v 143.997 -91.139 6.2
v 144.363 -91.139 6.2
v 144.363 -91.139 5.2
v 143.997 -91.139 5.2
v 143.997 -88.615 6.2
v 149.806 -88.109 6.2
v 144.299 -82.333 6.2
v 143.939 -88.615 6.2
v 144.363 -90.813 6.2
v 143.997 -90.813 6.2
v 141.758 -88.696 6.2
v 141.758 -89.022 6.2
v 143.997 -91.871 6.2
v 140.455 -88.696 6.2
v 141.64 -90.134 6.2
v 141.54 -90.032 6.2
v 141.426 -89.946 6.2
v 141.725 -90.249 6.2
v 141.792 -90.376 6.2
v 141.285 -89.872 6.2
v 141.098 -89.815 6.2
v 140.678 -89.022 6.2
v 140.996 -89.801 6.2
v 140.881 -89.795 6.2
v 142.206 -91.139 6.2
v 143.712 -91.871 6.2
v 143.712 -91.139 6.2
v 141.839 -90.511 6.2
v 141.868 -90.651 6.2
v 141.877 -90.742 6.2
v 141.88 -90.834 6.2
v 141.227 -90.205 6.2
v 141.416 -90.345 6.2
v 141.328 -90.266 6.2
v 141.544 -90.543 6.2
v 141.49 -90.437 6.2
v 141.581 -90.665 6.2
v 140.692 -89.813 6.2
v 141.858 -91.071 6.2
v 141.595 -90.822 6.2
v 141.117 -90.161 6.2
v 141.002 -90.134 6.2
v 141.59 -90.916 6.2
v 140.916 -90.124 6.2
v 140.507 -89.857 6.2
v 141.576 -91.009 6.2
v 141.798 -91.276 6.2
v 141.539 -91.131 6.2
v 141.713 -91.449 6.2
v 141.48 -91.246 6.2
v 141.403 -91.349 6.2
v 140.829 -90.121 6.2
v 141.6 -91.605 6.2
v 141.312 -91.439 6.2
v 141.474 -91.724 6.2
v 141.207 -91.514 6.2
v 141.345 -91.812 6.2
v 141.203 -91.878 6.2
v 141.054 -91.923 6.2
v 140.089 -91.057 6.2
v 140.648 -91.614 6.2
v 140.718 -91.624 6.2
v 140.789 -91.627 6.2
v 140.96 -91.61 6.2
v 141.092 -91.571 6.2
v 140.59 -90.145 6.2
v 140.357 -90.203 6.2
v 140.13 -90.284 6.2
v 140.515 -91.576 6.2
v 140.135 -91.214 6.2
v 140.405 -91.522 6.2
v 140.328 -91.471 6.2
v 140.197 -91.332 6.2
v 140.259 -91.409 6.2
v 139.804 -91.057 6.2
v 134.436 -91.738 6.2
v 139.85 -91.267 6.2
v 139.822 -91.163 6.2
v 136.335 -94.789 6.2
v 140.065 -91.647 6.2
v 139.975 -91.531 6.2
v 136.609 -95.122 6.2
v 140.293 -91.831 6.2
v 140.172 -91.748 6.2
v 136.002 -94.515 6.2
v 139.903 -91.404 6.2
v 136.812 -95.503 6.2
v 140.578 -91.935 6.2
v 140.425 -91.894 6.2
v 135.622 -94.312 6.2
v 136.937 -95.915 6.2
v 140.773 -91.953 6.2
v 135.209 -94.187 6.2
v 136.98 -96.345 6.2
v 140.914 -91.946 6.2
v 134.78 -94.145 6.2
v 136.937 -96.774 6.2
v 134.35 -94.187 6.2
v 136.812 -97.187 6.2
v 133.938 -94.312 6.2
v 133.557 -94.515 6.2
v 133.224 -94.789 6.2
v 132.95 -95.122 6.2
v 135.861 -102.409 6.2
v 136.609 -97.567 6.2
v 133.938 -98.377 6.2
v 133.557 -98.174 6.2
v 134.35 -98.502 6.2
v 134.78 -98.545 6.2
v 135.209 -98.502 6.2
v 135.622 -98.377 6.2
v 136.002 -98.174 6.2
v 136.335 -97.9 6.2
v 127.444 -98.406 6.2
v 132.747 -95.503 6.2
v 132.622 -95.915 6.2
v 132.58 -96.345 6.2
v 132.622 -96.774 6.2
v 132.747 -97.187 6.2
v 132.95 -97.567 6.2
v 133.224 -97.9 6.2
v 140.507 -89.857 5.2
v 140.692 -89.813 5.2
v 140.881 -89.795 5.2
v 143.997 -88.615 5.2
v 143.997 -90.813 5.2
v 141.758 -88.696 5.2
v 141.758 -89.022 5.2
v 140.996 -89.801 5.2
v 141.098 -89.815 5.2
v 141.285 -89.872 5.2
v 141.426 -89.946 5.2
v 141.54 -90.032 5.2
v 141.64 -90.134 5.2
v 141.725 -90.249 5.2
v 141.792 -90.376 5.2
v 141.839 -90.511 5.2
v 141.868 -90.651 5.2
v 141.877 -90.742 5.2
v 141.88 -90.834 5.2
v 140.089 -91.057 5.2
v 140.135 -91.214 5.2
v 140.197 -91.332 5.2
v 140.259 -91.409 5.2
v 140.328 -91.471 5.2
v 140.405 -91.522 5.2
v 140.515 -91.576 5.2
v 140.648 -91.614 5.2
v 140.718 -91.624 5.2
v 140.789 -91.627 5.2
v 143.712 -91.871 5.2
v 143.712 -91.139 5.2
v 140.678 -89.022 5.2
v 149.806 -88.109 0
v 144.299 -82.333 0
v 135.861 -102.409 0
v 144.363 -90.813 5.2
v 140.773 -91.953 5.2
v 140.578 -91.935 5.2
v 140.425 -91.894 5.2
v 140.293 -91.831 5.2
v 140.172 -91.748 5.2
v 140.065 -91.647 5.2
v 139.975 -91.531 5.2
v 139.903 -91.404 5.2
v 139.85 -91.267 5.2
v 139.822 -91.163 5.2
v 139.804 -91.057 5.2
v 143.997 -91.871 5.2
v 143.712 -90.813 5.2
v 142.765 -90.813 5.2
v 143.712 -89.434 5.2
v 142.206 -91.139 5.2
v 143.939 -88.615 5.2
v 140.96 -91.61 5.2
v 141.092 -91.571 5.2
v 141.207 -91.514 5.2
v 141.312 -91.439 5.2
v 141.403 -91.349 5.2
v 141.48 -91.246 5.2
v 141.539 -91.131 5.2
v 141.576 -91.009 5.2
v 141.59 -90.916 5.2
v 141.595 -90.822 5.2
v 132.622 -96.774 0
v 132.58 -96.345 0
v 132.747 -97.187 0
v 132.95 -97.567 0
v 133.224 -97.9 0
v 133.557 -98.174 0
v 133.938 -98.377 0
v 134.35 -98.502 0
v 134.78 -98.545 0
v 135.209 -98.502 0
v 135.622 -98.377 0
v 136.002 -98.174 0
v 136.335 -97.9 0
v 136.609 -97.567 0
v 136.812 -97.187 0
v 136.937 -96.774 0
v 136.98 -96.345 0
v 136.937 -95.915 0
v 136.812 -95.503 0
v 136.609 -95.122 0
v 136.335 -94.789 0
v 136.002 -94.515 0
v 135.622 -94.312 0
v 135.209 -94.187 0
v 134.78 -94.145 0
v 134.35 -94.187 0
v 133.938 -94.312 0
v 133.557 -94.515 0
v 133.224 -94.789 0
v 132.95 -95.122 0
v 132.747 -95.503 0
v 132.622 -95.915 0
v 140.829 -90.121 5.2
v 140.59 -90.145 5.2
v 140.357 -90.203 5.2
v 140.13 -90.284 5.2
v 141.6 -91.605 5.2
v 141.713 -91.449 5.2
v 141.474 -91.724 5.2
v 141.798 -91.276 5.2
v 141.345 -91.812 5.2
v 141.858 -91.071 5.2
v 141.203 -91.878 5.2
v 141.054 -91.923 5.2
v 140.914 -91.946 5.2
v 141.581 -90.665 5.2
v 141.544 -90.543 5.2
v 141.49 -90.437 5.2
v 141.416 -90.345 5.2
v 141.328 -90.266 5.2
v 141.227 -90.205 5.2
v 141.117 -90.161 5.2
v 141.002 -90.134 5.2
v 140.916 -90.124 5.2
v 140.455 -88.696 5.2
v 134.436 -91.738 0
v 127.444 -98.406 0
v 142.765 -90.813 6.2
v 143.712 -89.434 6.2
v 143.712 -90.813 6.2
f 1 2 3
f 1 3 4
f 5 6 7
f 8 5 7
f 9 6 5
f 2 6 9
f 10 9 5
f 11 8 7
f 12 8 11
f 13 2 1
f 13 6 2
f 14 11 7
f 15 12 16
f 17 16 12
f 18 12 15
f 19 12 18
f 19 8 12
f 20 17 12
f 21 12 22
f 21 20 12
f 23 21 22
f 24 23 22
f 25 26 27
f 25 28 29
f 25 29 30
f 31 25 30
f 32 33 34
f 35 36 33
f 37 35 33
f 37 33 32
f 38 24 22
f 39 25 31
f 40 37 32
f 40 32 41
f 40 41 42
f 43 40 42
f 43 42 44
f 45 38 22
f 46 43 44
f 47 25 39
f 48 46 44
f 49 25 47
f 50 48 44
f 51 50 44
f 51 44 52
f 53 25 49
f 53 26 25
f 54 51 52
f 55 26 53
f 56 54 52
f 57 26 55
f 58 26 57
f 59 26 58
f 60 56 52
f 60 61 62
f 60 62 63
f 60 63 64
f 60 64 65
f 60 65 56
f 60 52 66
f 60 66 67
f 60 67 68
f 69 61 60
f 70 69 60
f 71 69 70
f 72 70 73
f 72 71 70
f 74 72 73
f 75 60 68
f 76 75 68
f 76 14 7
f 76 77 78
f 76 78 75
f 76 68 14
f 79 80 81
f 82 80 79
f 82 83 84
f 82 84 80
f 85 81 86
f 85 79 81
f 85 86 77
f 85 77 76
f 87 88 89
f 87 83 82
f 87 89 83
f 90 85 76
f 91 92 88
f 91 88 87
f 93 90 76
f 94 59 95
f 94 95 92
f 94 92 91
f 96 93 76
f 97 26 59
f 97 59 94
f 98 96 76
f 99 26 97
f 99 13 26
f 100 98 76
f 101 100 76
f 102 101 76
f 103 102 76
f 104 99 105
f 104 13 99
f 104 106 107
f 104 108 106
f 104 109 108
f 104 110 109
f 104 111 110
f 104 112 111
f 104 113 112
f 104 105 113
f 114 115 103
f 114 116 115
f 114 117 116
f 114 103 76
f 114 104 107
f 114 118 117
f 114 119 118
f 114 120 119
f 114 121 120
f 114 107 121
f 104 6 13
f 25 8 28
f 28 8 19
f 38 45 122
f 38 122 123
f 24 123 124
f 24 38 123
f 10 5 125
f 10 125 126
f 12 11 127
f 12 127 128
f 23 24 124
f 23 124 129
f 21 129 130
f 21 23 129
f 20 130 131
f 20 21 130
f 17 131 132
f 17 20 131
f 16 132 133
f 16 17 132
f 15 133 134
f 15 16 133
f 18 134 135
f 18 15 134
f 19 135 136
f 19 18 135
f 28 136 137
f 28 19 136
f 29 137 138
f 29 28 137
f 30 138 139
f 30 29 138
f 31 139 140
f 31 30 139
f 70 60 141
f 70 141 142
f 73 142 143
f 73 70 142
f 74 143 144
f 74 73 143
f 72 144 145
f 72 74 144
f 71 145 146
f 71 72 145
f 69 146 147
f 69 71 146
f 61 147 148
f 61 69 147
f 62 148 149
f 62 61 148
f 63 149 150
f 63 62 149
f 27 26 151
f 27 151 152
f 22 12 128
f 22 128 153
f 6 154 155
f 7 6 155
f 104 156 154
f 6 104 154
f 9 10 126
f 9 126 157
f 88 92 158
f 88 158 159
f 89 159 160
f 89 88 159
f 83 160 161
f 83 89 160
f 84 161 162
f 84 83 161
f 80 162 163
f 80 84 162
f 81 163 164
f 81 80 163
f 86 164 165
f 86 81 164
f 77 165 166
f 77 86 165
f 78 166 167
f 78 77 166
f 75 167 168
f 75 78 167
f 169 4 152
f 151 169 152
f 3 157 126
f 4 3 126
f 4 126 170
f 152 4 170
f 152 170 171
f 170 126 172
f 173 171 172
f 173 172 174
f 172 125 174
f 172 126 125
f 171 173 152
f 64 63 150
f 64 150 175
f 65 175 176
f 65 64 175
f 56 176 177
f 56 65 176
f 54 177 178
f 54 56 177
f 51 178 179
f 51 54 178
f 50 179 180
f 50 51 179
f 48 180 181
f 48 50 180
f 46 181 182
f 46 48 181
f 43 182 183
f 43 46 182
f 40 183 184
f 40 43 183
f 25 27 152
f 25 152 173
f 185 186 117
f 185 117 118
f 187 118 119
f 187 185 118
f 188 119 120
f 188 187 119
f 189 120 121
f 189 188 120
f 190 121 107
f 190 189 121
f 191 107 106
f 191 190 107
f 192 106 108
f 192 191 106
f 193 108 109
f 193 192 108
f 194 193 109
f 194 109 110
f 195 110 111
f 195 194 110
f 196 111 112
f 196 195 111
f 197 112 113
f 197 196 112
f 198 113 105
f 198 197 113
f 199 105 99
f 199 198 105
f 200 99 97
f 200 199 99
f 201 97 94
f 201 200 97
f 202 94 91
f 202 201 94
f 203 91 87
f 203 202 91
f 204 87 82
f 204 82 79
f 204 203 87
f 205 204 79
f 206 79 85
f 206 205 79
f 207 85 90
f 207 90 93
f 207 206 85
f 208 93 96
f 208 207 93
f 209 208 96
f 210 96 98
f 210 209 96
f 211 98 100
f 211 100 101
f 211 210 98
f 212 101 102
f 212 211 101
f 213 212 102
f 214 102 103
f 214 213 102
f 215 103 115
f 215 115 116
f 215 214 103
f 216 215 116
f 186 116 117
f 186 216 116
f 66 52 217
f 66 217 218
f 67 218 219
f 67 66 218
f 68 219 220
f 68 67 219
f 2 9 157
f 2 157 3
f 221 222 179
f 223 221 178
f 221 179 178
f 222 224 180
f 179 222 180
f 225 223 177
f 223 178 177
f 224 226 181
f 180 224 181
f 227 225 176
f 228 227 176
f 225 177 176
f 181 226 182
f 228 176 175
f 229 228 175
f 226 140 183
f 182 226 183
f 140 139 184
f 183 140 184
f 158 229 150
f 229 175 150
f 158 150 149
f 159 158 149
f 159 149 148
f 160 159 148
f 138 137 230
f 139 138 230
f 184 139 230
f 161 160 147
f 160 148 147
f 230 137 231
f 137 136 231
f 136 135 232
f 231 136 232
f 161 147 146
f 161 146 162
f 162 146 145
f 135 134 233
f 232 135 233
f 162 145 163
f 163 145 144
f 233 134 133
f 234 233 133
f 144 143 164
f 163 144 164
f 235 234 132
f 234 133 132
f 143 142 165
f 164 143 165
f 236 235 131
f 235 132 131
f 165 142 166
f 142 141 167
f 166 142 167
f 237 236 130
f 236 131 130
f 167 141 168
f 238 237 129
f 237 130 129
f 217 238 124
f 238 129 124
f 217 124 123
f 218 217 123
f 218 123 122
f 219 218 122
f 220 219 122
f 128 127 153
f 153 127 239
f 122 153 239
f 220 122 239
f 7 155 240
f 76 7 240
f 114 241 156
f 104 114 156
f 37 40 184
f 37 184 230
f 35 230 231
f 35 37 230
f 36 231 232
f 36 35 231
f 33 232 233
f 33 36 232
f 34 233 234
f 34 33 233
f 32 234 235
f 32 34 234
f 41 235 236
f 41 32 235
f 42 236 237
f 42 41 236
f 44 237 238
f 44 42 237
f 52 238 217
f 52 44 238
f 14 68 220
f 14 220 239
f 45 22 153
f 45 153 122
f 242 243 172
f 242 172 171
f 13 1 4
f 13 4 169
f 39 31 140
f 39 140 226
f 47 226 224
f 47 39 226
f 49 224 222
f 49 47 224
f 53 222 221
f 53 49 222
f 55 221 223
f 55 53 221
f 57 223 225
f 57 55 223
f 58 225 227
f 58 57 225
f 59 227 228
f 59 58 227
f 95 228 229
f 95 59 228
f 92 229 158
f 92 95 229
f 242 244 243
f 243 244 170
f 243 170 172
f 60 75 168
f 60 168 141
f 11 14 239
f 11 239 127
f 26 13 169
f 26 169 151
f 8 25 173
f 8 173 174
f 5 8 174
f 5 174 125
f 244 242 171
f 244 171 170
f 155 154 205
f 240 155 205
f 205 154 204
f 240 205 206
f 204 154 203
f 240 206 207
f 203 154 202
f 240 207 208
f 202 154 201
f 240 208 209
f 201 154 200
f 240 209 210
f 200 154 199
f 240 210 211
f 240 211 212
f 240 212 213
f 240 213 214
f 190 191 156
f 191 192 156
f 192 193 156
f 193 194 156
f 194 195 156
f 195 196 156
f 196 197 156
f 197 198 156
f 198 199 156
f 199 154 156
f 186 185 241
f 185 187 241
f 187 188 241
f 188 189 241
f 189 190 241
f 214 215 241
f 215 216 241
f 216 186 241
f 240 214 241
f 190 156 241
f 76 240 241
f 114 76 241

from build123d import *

# Parameters (mm, degrees)
SKETCH1_R           = 2.2
BOSS_EXTRUDE1_DEPTH = 6.2
CUT_EXTRUDE1_DEPTH  = 1


with BuildPart() as part:
    # Sketch1 → Boss-Extrude1 (new body)
    with BuildSketch(Plane(origin=(0, 0, 0), x_dir=(-1, 0, 0), z_dir=(0, 0, 1))):
        Polygon((-135.861235396, 102.40882942), (-149.806405315, 88.109421961), (-144.298520867, 82.333425686), (-134.435779681, 91.738355366), (-127.443880814, 98.405702296), align=None)
        with Locations((-134.779596853, 96.344682986)):
            Circle(SKETCH1_R, mode=Mode.SUBTRACT)
    extrude(amount=BOSS_EXTRUDE1_DEPTH)

    # Sketch2 → Cut-Extrude1 (cut)
    with BuildSketch(Plane.XY.offset(6.2)):
        with BuildLine():
            Line((141.757865871, -88.696242194), (141.757865871, -89.021883219))
            Line((141.757865871, -89.021883219), (140.677907938, -89.021883219))
            Line((140.677907938, -89.021883219), (140.506819196, -89.856974365))
            add(Edge.make_bspline(
                [(140.506819196, -89.856974365), (140.540434168, -89.847694047), (140.605557859, -89.829714899), (140.70167859, -89.809752521), (140.792930089, -89.797718869), (140.852144175, -89.796075751), (140.880797562, -89.795280655)],
                knots=[0, 0, 0, 0, 0.000104595, 0.000202637, 0.000294305, 0.000380252, 0.000380252, 0.000380252, 0.000380252], degree=3))
            add(Edge.make_bspline(
                [(140.880797562, -89.795280655), (140.916252097, -89.79604804), (140.985964572, -89.79755691), (141.087962759, -89.812045659), (141.185329027, -89.834851153), (141.277859748, -89.866710483), (141.365726105, -89.907450027), (141.448119678, -89.958340687), (141.526277214, -90.01778878), (141.598796567, -90.08613747), (141.664586475, -90.161359222), (141.722431337, -90.242238148), (141.771564544, -90.327988241), (141.811080372, -90.419428794), (141.842634732, -90.515548883), (141.863636899, -90.617359868), (141.877622056, -90.723902092), (141.879184507, -90.796749809), (141.879981255, -90.833897442)],
                knots=[0, 0, 0, 0, 0.000106308, 0.000209029, 0.000308378, 0.000405929, 0.000502102, 0.000598312, 0.00069588, 0.000796219, 0.000896736, 0.000995218, 0.001094066, 0.001192613, 0.001293582, 0.001396995, 0.001504047, 0.001615439, 0.001615439, 0.001615439, 0.001615439], degree=3))
            add(Edge.make_bspline(
                [(141.879981255, -90.833897442), (141.879377937, -90.859771171), (141.878179454, -90.911168967), (141.872084735, -90.987499777), (141.860350193, -91.062214633), (141.844595186, -91.135323445), (141.824145992, -91.206687805), (141.799390922, -91.276511976), (141.769095954, -91.34436137), (141.735866064, -91.410877978), (141.698449616, -91.474558052), (141.65692197, -91.534111061), (141.61304756, -91.590430374), (141.565838589, -91.642911975), (141.514856258, -91.691210998), (141.460718002, -91.735614082), (141.403855821, -91.776872146), (141.343389994, -91.813310437), (141.280667885, -91.846841119), (141.214783716, -91.874348899), (141.147237224, -91.898942021), (141.077056229, -91.91854495), (141.004399699, -91.933905196), (140.929147867, -91.944337883), (140.851695402, -91.951936509), (140.799194498, -91.952412175), (140.772674565, -91.95265245)],
                knots=[0, 0, 0, 0, 7.7636e-05, 0.000154223, 0.000229512, 0.000304362, 0.000378447, 0.000452077, 0.000526407, 0.000601214, 0.00067506, 0.000747747, 0.00081887, 0.000889121, 0.000959302, 0.001029336, 0.001099058, 0.00116985, 0.001240974, 0.00131221, 0.00138383, 0.001456517, 0.001530612, 0.001606437, 0.001684346, 0.001763871, 0.001763871, 0.001763871, 0.001763871], degree=3))
            add(Edge.make_bspline(
                [(140.772674565, -91.95265245), (140.741038701, -91.952025761), (140.678798876, -91.950792825), (140.587612361, -91.937894628), (140.499878398, -91.919421647), (140.416303235, -91.891630173), (140.336137874, -91.856807413), (140.260461551, -91.812796315), (140.187340597, -91.762922414), (140.119747535, -91.704066665), (140.057013061, -91.63973601), (140.000855014, -91.569924436), (139.950840983, -91.495784156), (139.907771884, -91.416955116), (139.871034394, -91.333644449), (139.842173654, -91.245540013), (139.818879718, -91.153102152), (139.809025044, -91.089462896), (139.804019717, -91.05713963)],
                knots=[0, 0, 0, 0, 9.4843e-05, 0.000186593, 0.000275792, 0.000363484, 0.000450342, 0.000537514, 0.000625728, 0.000715478, 0.000805885, 0.000894984, 0.00098389, 0.001073836, 0.001164117, 0.001256635, 0.001351658, 0.001449737, 0.001449737, 0.001449737, 0.001449737], degree=3))
            Line((139.804019717, -91.05713963), (140.088955614, -91.05713963))
            add(Edge.make_bspline(
                [(140.088955614, -91.05713963), (140.09596652, -91.08741684), (140.10944187, -91.14561132), (140.139019942, -91.227373322), (140.175183986, -91.300234332), (140.218186502, -91.365158169), (140.269485459, -91.421772045), (140.328022869, -91.472224665), (140.393652589, -91.517740675), (140.466580733, -91.5556799), (140.543518312, -91.588036555), (140.624042853, -91.609582735), (140.705961796, -91.624732831), (140.761368603, -91.626249357), (140.789211023, -91.627011425)],
                knots=[0, 0, 0, 0, 9.3172e-05, 0.000179081, 0.000260145, 0.000336703, 0.000411917, 0.000488562, 0.000568128, 0.000650923, 0.00073478, 0.000817953, 0.000900557, 0.000983994, 0.000983994, 0.000983994, 0.000983994], degree=3))
            add(Edge.make_bspline(
                [(140.789211023, -91.627011425), (140.816387612, -91.626266862), (140.869898538, -91.624800811), (140.948648867, -91.613516851), (141.024679117, -91.596138197), (141.097239077, -91.570130542), (141.167598473, -91.538521405), (141.233977536, -91.497958443), (141.298296575, -91.451276855), (141.358556382, -91.397794769), (141.413746454, -91.338857975), (141.462510935, -91.275832054), (141.503129992, -91.208597486), (141.53736022, -91.138318269), (141.563352855, -91.064224149), (141.581895745, -90.986662369), (141.592784234, -90.905441351), (141.59428209, -90.850042763), (141.595045358, -90.821813107)],
                knots=[0, 0, 0, 0, 8.15e-05, 0.000160473, 0.000238226, 0.000315066, 0.000391338, 0.000469218, 0.000547964, 0.000629516, 0.000710512, 0.000789892, 0.000868102, 0.000945761, 0.001024012, 0.00110315, 0.001184644, 0.001269321, 0.001269321, 0.001269321, 0.001269321], degree=3))
            add(Edge.make_bspline(
                [(141.595045358, -90.821813107), (141.594448023, -90.79634439), (141.593278825, -90.746492999), (141.583726093, -90.673559433), (141.567109983, -90.604550316), (141.544046892, -90.539132404), (141.514764767, -90.477243995), (141.478981326, -90.418821219), (141.43602503, -90.364634099), (141.386955959, -90.314657283), (141.333200451, -90.268533718), (141.273833627, -90.229214439), (141.210097836, -90.196136457), (141.142760985, -90.167590487), (141.070221399, -90.147088382), (140.993915596, -90.131696086), (140.913019583, -90.12279215), (140.857710459, -90.121556723), (140.829280134, -90.120921681)],
                knots=[0, 0, 0, 0, 7.6388e-05, 0.000149519, 0.000220172, 0.000288967, 0.000357247, 0.000425206, 0.000494043, 0.000564207, 0.000635056, 0.000706145, 0.000777268, 0.000850264, 0.000925136, 0.001002969, 0.001083601, 0.001168886, 0.001168886, 0.001168886, 0.001168886], degree=3))
            add(Edge.make_bspline(
                [(140.829280134, -90.120921681), (140.80467032, -90.12144836), (140.753857297, -90.122535819), (140.675913019, -90.130542712), (140.594005527, -90.143459787), (140.508448806, -90.161227311), (140.418985917, -90.184478359), (140.325805653, -90.212340799), (140.228712097, -90.245652898), (140.163291019, -90.270809978), (140.129660743, -90.283742194)],
                knots=[0, 0, 0, 0, 7.3822e-05, 0.000152423, 0.000234822, 0.000322511, 0.00041445, 0.000512043, 0.000614219, 0.000722306, 0.000722306, 0.000722306, 0.000722306], degree=3))
            Line((140.129660743, -90.283742194), (140.455301768, -88.696242194))
            Line((140.455301768, -88.696242194), (141.757865871, -88.696242194))
        make_face()
        Polygon((143.938770318, -88.614831937), (143.996647922, -88.614831937), (143.996647922, -90.81290886), (144.362994076, -90.81290886), (144.362994076, -91.138549886), (143.996647922, -91.138549886), (143.996647922, -91.871242194), (143.711712025, -91.871242194), (143.711712025, -91.138549886), (142.205622281, -91.138549886), align=None)
        Polygon((143.711712025, -90.81290886), (143.711712025, -89.434022643), (142.765317794, -90.81290886), align=None, mode=Mode.SUBTRACT)
    extrude(amount=-CUT_EXTRUDE1_DEPTH, mode=Mode.SUBTRACT)


solid = part.part
